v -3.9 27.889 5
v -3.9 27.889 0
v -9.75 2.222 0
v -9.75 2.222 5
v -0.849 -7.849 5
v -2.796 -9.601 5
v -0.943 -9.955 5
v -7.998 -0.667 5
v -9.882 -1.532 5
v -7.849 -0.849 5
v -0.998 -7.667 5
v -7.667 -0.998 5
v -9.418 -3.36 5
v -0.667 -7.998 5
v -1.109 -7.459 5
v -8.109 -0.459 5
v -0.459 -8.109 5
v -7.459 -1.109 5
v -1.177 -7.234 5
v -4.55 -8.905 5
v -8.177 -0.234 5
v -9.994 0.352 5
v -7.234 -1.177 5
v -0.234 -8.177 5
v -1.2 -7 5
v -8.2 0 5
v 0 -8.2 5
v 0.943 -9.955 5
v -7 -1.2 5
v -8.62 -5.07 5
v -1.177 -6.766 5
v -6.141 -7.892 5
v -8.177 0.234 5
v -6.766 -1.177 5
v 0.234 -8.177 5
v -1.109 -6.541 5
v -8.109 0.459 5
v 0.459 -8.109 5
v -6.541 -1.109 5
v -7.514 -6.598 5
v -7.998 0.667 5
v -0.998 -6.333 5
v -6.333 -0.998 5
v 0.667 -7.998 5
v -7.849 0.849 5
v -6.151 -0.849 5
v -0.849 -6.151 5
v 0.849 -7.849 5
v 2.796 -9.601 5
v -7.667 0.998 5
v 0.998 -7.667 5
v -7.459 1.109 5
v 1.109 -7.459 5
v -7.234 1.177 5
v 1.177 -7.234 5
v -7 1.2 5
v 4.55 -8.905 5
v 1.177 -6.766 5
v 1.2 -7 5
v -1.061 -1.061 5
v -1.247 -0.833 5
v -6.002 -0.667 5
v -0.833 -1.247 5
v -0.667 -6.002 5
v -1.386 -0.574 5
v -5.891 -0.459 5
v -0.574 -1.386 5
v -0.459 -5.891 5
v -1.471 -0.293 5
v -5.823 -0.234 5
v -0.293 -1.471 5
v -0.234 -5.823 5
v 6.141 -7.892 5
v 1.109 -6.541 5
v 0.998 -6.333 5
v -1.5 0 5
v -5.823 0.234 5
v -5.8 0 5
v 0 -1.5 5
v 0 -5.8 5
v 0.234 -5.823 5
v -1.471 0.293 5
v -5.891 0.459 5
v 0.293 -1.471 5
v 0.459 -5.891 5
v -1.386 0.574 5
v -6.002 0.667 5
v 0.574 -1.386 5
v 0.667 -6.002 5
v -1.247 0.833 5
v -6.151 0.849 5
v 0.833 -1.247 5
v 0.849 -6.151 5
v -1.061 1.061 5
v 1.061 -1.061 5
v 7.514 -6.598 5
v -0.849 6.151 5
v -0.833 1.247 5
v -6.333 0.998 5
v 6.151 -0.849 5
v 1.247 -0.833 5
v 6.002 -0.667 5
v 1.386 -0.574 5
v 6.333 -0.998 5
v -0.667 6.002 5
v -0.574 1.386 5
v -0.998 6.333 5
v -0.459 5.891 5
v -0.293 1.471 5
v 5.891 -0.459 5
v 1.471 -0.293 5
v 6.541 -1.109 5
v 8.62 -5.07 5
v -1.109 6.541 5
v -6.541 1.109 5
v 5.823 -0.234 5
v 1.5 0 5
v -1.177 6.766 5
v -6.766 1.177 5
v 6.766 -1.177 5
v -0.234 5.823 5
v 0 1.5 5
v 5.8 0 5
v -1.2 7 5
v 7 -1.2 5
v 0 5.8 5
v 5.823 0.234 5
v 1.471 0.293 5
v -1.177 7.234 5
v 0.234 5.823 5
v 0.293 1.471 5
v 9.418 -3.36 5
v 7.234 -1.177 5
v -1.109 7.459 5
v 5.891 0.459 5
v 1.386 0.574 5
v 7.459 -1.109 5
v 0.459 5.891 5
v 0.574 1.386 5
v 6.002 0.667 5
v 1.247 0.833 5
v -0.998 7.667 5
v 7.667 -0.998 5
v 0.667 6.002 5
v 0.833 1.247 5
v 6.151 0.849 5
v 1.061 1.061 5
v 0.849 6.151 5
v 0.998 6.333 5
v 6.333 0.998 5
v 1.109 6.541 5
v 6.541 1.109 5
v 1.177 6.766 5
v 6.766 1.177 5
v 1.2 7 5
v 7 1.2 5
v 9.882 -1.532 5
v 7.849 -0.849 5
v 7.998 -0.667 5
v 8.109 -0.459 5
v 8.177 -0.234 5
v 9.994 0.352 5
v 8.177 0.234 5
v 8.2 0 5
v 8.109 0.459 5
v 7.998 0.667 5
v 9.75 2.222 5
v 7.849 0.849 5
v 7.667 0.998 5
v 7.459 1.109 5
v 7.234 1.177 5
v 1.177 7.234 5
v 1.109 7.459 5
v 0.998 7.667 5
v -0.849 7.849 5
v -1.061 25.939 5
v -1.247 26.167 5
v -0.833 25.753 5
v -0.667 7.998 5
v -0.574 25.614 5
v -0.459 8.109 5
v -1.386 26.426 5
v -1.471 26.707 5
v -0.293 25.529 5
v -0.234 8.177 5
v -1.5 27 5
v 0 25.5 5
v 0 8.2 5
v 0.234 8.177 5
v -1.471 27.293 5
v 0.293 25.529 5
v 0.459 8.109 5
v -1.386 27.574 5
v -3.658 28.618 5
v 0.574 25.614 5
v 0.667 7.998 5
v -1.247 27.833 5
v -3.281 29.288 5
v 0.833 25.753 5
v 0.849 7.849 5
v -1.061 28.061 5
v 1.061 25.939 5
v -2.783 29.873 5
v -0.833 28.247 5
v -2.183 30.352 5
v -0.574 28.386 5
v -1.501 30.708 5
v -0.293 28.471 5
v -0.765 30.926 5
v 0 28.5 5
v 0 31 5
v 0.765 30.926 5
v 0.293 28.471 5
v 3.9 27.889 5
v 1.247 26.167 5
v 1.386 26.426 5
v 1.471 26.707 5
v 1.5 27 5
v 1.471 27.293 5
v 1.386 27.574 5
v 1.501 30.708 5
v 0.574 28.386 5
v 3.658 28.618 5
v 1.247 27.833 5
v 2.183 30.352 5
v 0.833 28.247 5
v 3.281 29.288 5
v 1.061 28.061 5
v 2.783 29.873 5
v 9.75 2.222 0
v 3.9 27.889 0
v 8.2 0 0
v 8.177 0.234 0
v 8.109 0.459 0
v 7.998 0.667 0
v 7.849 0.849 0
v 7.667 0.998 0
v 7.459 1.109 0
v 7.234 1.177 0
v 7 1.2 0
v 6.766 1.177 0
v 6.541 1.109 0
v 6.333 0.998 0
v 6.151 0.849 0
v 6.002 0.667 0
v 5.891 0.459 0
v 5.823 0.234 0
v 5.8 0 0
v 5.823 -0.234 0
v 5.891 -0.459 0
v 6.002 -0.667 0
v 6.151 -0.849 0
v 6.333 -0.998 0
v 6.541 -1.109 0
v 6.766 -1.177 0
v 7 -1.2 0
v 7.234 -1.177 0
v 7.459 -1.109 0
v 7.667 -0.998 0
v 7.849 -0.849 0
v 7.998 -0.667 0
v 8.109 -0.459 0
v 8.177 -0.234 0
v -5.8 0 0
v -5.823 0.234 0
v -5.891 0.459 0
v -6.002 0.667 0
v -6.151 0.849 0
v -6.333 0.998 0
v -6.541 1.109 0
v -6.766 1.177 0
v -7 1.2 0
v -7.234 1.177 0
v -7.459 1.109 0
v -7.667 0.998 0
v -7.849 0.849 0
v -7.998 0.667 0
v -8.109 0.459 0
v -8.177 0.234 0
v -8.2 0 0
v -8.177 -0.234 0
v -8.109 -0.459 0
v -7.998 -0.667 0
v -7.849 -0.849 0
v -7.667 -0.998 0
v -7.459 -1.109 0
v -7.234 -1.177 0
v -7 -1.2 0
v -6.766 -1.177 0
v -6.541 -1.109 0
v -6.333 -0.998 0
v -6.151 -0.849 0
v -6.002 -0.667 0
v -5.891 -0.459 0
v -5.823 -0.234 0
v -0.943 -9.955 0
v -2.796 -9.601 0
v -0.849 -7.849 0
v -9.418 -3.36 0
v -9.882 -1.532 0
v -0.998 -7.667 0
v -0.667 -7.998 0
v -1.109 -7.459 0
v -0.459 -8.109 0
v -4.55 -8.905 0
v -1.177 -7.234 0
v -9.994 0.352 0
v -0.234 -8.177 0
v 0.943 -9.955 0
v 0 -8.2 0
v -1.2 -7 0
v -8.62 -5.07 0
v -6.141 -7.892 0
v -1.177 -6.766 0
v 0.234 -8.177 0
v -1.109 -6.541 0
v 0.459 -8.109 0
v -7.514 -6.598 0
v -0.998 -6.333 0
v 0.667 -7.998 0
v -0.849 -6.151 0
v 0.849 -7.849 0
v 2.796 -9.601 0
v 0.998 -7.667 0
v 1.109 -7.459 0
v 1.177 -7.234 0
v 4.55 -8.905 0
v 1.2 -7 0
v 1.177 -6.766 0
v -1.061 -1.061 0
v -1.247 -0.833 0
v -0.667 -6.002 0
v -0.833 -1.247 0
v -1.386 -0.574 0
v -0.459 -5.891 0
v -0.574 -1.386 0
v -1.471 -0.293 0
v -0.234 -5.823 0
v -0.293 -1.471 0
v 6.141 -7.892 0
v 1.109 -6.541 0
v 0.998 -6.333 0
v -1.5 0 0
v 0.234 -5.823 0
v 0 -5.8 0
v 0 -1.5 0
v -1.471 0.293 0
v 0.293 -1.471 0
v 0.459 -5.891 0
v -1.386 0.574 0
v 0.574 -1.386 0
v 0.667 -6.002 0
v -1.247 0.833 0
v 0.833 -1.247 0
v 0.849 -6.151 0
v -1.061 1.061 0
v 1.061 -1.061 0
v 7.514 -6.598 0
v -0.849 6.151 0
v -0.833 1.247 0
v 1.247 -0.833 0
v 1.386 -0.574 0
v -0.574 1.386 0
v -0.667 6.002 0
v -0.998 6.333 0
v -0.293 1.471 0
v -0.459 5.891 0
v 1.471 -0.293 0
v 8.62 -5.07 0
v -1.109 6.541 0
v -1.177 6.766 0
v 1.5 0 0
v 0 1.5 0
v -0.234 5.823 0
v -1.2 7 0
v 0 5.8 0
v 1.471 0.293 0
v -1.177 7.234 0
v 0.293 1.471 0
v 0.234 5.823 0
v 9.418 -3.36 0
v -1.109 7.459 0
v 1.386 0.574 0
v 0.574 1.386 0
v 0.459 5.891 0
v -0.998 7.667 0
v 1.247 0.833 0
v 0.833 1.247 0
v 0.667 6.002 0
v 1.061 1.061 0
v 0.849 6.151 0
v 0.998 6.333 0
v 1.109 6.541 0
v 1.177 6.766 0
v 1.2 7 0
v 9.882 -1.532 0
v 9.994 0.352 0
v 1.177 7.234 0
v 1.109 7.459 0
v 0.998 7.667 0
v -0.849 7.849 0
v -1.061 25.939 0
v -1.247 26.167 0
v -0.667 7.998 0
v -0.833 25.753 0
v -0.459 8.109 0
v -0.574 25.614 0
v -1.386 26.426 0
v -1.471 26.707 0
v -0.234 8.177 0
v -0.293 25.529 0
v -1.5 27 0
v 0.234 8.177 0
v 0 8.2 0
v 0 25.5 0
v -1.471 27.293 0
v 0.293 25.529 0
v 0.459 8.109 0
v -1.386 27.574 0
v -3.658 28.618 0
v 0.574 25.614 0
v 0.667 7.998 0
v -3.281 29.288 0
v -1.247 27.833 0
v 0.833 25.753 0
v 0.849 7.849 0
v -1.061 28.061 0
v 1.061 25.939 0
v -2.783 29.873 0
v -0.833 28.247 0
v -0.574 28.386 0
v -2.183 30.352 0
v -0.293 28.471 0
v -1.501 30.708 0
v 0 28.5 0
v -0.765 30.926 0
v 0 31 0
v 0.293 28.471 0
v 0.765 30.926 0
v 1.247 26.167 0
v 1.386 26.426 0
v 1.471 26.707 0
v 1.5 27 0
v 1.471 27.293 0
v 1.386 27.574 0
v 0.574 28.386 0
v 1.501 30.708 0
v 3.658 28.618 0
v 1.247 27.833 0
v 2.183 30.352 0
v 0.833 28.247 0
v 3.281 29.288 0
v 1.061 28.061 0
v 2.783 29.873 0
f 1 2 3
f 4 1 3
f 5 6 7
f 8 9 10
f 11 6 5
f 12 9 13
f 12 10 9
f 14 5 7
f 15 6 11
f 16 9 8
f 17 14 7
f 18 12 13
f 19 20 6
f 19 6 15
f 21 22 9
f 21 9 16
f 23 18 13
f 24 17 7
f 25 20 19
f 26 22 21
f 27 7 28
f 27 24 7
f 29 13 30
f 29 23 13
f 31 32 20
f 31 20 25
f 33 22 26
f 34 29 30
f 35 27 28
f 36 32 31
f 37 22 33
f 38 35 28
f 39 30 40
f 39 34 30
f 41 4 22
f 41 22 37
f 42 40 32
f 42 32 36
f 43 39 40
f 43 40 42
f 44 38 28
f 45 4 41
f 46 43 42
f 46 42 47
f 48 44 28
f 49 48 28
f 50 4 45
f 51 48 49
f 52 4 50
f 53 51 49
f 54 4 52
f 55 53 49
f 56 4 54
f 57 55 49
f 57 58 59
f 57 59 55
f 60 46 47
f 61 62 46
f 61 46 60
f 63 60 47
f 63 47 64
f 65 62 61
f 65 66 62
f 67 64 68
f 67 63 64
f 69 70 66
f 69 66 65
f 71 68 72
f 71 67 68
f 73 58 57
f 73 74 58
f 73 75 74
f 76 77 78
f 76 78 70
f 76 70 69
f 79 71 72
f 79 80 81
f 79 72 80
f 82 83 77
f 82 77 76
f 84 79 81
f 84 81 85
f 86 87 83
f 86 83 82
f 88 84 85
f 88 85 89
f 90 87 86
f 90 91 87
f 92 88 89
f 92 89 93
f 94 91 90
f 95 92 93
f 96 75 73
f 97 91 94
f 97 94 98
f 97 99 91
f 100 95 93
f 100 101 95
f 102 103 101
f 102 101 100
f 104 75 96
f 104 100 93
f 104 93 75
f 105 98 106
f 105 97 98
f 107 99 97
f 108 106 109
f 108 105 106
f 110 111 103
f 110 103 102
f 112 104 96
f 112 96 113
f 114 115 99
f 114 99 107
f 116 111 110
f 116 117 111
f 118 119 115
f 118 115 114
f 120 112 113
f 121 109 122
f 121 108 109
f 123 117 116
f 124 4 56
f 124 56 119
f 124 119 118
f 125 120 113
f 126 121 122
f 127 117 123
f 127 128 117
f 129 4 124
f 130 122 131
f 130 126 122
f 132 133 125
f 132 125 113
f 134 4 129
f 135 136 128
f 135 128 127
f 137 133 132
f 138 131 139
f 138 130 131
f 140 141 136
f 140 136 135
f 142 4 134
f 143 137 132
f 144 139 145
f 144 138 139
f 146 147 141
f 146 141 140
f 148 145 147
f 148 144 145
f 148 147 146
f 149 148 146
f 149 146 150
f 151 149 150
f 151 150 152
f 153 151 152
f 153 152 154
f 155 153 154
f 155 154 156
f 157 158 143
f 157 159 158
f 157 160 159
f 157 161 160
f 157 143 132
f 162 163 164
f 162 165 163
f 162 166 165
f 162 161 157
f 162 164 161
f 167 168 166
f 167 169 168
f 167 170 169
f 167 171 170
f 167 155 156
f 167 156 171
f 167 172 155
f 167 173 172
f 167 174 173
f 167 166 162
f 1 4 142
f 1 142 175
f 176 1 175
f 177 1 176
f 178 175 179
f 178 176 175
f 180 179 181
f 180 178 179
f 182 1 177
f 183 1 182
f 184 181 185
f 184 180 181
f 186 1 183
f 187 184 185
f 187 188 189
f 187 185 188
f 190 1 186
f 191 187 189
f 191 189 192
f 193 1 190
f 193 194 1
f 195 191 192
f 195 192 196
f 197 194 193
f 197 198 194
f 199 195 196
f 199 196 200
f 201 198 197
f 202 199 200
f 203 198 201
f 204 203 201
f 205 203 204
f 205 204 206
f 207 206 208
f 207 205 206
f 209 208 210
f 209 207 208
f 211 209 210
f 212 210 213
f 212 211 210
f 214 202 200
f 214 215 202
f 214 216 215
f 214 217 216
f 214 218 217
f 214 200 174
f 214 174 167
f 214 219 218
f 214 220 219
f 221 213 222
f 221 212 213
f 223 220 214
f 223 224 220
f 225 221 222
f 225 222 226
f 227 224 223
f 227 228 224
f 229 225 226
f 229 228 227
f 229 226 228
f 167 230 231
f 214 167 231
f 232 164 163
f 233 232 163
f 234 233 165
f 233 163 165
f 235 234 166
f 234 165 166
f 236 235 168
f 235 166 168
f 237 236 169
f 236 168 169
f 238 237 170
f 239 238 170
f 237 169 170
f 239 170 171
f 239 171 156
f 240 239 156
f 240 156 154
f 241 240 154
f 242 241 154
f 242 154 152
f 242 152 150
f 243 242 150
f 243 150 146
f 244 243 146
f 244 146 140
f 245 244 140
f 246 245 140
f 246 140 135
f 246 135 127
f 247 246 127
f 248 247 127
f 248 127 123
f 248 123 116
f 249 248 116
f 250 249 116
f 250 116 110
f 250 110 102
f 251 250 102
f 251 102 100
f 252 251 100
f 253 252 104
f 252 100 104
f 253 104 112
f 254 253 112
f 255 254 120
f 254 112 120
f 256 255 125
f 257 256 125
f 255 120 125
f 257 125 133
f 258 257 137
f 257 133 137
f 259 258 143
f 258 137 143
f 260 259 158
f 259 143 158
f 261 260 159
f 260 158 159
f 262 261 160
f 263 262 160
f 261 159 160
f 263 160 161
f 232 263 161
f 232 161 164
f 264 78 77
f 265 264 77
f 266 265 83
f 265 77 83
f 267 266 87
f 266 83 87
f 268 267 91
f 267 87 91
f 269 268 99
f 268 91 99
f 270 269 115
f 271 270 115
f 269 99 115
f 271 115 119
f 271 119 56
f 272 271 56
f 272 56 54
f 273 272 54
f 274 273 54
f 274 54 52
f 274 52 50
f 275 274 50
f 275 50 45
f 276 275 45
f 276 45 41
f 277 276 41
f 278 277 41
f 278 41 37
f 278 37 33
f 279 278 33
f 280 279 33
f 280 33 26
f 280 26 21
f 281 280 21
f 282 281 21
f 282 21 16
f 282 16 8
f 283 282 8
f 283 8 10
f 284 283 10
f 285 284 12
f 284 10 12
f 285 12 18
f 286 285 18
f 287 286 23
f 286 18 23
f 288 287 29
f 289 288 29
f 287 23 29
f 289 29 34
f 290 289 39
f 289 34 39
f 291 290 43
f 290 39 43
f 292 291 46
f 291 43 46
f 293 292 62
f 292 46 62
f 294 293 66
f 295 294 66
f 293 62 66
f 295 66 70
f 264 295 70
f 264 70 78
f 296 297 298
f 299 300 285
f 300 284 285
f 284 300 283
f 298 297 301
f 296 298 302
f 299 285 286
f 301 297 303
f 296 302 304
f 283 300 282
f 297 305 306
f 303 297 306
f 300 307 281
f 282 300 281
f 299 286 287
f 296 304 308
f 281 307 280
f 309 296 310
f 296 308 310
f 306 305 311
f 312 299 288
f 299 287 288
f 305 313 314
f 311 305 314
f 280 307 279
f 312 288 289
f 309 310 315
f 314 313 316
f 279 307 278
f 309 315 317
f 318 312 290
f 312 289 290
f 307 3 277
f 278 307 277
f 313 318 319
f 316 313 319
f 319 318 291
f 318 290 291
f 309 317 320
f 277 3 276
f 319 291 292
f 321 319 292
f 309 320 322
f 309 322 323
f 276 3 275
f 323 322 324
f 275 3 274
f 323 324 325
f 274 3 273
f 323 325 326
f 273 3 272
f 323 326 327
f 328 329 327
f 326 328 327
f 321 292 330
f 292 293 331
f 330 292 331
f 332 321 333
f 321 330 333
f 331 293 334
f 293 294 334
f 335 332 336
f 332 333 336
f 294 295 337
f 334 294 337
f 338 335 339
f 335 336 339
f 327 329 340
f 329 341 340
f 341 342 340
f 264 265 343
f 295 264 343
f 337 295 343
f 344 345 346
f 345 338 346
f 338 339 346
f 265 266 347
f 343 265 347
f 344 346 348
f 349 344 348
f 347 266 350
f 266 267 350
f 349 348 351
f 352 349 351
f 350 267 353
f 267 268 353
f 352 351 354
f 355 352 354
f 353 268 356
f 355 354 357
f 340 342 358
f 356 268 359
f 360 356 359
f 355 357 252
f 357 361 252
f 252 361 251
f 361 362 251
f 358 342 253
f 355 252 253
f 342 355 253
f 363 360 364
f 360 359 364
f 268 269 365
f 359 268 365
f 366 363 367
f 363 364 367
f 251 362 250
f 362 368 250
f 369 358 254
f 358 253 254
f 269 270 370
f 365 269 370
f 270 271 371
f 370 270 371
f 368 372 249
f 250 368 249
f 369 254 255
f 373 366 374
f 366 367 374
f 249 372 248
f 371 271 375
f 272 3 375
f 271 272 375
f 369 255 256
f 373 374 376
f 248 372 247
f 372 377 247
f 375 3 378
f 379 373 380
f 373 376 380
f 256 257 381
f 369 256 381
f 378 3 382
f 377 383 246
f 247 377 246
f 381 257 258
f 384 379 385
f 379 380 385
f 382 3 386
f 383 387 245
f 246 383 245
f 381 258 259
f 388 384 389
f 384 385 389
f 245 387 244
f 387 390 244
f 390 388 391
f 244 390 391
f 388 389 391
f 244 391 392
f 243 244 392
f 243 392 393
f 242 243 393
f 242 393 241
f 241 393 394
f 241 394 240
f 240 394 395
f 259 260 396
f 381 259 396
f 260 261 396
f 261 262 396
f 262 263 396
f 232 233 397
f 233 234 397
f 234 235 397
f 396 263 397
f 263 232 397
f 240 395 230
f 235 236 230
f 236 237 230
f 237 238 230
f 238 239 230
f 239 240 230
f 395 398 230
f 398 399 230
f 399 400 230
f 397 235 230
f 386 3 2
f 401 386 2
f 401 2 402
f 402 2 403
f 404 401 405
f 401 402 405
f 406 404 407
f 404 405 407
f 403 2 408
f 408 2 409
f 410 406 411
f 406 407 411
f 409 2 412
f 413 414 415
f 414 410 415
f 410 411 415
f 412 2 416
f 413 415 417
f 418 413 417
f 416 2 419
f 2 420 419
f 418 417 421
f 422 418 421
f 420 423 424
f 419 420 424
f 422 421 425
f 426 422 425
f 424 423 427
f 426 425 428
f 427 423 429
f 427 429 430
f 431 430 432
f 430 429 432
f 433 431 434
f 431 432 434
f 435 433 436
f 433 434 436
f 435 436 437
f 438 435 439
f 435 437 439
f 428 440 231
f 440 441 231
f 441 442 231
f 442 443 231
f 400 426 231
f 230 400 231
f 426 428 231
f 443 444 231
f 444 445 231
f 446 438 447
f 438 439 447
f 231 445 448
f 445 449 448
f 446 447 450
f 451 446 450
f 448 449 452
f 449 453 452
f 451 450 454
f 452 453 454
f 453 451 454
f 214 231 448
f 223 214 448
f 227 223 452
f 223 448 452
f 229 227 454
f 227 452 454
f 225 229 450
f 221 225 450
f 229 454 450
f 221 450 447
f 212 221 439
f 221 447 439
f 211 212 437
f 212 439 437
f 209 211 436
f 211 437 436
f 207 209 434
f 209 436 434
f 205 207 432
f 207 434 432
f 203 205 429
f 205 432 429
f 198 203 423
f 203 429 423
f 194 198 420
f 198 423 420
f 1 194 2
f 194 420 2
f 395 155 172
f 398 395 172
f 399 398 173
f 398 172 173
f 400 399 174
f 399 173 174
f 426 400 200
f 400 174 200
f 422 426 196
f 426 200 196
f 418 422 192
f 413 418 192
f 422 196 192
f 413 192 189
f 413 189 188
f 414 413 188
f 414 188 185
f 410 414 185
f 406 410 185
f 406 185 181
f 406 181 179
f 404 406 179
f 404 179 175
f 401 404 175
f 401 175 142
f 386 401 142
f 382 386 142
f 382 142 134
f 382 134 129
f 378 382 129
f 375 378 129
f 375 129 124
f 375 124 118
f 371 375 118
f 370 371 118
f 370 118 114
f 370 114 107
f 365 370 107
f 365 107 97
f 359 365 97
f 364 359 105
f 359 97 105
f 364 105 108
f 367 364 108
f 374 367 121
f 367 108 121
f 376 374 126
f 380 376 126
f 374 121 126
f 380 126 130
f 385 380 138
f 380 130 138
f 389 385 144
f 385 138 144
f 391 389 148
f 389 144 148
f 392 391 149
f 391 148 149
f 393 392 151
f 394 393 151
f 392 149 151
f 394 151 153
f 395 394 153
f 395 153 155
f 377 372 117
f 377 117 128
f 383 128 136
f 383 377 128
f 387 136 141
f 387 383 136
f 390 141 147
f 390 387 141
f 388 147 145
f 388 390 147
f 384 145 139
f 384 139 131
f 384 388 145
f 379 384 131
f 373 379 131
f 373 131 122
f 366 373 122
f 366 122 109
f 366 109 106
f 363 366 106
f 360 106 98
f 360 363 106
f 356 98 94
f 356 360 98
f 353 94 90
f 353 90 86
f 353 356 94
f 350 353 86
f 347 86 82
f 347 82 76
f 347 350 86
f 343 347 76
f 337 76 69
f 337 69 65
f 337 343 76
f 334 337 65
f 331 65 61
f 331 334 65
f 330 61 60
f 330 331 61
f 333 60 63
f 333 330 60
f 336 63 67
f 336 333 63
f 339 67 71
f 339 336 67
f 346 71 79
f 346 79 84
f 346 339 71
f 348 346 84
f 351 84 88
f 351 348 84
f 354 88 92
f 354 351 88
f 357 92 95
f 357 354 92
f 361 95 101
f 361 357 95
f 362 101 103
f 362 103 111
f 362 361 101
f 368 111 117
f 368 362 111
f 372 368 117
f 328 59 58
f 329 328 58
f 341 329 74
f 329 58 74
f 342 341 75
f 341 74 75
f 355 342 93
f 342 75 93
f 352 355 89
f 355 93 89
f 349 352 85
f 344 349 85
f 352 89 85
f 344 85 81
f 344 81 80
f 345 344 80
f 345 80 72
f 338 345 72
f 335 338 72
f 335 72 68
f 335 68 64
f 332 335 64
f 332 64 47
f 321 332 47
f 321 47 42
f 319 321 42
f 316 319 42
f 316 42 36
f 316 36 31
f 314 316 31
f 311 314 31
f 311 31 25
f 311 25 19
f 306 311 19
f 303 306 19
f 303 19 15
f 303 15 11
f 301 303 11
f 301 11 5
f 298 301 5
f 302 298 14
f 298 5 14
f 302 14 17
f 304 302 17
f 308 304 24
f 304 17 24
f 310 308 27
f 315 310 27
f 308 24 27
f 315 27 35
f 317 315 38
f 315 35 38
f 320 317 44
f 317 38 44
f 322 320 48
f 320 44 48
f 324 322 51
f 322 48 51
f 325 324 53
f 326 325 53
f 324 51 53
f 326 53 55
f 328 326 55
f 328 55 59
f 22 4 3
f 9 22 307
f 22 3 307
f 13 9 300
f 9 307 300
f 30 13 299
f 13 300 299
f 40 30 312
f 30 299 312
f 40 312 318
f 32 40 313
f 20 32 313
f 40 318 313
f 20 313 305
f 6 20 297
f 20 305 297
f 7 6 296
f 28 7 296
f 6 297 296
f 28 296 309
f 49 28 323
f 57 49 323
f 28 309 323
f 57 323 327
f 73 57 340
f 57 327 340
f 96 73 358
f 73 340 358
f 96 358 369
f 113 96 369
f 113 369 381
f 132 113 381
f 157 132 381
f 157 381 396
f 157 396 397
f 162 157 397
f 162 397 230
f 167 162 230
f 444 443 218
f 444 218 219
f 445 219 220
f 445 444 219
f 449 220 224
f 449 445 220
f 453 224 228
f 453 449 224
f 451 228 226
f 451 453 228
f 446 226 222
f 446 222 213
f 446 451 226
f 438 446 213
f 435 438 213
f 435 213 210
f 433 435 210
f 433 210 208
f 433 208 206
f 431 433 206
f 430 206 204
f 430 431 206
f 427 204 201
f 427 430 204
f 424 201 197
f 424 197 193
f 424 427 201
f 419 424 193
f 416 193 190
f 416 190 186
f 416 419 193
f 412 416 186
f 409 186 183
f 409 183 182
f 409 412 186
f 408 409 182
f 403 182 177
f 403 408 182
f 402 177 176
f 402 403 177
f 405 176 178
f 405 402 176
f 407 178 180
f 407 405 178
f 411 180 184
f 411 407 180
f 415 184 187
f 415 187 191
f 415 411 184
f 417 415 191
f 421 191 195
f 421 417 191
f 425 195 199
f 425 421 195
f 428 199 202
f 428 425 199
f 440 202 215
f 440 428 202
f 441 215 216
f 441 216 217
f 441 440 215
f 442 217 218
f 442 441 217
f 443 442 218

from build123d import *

# Parameters (mm, degrees)
IZIM1_R                     = 10
IZIM1_R_2                   = 1.5
IZIM1_R_3                   = 4
Y_KSEKLIK_EKSTR_ZYON1_DEPTH = 5
IZIM2_R                     = 1.2
KES_EKSTR_ZYON1_DEPTH       = 10


with BuildPart() as part:
    # Çizim1 → Yükseklik-Ekstrüzyon1 (new body)
    # profile 1 of 3: a face of its own
    with BuildSketch(Plane.XY):
        Circle(IZIM1_R)
        Circle(IZIM1_R_2, mode=Mode.SUBTRACT)
    # profile 2 of 3: a face of its own
    with BuildSketch(Plane.XY):
        with BuildLine():
            Line((-3.899984172, 27.888888889), (-9.74996043, 2.222222222))
            ThreePointArc((-9.74996043, 2.222222222), (0, 10), (9.74996043, 2.222222222))
            Line((9.74996043, 2.222222222), (3.899984172, 27.888888889))
            ThreePointArc((3.899984172, 27.888888889), (3.974917401, 27.447248986), (4, 27))
            ThreePointArc((4, 27), (-0.447248986, 23.025082599), (-3.899984172, 27.888888889))
        make_face()
    # profile 3 of 3: a face of its own
    with BuildSketch(Plane.XY):
        with Locations((0, 27)):
            Circle(IZIM1_R_3)
        with Locations((0, 27)):
            Circle(IZIM1_R_2, mode=Mode.SUBTRACT)
    extrude(amount=Y_KSEKLIK_EKSTR_ZYON1_DEPTH)

    # Çizim2 → Kes-Ekstrüzyon1 (cut)
    with BuildSketch(Plane.XY.offset(5)):
        with Locations((0, 7)):
            Circle(IZIM2_R)
        with Locations((-7, 0)):
            Circle(IZIM2_R)
        with Locations((0, -7)):
            Circle(IZIM2_R)
        with Locations((7, 0)):
            Circle(IZIM2_R)
    extrude(amount=-KES_EKSTR_ZYON1_DEPTH, mode=Mode.SUBTRACT)


solid = part.part
